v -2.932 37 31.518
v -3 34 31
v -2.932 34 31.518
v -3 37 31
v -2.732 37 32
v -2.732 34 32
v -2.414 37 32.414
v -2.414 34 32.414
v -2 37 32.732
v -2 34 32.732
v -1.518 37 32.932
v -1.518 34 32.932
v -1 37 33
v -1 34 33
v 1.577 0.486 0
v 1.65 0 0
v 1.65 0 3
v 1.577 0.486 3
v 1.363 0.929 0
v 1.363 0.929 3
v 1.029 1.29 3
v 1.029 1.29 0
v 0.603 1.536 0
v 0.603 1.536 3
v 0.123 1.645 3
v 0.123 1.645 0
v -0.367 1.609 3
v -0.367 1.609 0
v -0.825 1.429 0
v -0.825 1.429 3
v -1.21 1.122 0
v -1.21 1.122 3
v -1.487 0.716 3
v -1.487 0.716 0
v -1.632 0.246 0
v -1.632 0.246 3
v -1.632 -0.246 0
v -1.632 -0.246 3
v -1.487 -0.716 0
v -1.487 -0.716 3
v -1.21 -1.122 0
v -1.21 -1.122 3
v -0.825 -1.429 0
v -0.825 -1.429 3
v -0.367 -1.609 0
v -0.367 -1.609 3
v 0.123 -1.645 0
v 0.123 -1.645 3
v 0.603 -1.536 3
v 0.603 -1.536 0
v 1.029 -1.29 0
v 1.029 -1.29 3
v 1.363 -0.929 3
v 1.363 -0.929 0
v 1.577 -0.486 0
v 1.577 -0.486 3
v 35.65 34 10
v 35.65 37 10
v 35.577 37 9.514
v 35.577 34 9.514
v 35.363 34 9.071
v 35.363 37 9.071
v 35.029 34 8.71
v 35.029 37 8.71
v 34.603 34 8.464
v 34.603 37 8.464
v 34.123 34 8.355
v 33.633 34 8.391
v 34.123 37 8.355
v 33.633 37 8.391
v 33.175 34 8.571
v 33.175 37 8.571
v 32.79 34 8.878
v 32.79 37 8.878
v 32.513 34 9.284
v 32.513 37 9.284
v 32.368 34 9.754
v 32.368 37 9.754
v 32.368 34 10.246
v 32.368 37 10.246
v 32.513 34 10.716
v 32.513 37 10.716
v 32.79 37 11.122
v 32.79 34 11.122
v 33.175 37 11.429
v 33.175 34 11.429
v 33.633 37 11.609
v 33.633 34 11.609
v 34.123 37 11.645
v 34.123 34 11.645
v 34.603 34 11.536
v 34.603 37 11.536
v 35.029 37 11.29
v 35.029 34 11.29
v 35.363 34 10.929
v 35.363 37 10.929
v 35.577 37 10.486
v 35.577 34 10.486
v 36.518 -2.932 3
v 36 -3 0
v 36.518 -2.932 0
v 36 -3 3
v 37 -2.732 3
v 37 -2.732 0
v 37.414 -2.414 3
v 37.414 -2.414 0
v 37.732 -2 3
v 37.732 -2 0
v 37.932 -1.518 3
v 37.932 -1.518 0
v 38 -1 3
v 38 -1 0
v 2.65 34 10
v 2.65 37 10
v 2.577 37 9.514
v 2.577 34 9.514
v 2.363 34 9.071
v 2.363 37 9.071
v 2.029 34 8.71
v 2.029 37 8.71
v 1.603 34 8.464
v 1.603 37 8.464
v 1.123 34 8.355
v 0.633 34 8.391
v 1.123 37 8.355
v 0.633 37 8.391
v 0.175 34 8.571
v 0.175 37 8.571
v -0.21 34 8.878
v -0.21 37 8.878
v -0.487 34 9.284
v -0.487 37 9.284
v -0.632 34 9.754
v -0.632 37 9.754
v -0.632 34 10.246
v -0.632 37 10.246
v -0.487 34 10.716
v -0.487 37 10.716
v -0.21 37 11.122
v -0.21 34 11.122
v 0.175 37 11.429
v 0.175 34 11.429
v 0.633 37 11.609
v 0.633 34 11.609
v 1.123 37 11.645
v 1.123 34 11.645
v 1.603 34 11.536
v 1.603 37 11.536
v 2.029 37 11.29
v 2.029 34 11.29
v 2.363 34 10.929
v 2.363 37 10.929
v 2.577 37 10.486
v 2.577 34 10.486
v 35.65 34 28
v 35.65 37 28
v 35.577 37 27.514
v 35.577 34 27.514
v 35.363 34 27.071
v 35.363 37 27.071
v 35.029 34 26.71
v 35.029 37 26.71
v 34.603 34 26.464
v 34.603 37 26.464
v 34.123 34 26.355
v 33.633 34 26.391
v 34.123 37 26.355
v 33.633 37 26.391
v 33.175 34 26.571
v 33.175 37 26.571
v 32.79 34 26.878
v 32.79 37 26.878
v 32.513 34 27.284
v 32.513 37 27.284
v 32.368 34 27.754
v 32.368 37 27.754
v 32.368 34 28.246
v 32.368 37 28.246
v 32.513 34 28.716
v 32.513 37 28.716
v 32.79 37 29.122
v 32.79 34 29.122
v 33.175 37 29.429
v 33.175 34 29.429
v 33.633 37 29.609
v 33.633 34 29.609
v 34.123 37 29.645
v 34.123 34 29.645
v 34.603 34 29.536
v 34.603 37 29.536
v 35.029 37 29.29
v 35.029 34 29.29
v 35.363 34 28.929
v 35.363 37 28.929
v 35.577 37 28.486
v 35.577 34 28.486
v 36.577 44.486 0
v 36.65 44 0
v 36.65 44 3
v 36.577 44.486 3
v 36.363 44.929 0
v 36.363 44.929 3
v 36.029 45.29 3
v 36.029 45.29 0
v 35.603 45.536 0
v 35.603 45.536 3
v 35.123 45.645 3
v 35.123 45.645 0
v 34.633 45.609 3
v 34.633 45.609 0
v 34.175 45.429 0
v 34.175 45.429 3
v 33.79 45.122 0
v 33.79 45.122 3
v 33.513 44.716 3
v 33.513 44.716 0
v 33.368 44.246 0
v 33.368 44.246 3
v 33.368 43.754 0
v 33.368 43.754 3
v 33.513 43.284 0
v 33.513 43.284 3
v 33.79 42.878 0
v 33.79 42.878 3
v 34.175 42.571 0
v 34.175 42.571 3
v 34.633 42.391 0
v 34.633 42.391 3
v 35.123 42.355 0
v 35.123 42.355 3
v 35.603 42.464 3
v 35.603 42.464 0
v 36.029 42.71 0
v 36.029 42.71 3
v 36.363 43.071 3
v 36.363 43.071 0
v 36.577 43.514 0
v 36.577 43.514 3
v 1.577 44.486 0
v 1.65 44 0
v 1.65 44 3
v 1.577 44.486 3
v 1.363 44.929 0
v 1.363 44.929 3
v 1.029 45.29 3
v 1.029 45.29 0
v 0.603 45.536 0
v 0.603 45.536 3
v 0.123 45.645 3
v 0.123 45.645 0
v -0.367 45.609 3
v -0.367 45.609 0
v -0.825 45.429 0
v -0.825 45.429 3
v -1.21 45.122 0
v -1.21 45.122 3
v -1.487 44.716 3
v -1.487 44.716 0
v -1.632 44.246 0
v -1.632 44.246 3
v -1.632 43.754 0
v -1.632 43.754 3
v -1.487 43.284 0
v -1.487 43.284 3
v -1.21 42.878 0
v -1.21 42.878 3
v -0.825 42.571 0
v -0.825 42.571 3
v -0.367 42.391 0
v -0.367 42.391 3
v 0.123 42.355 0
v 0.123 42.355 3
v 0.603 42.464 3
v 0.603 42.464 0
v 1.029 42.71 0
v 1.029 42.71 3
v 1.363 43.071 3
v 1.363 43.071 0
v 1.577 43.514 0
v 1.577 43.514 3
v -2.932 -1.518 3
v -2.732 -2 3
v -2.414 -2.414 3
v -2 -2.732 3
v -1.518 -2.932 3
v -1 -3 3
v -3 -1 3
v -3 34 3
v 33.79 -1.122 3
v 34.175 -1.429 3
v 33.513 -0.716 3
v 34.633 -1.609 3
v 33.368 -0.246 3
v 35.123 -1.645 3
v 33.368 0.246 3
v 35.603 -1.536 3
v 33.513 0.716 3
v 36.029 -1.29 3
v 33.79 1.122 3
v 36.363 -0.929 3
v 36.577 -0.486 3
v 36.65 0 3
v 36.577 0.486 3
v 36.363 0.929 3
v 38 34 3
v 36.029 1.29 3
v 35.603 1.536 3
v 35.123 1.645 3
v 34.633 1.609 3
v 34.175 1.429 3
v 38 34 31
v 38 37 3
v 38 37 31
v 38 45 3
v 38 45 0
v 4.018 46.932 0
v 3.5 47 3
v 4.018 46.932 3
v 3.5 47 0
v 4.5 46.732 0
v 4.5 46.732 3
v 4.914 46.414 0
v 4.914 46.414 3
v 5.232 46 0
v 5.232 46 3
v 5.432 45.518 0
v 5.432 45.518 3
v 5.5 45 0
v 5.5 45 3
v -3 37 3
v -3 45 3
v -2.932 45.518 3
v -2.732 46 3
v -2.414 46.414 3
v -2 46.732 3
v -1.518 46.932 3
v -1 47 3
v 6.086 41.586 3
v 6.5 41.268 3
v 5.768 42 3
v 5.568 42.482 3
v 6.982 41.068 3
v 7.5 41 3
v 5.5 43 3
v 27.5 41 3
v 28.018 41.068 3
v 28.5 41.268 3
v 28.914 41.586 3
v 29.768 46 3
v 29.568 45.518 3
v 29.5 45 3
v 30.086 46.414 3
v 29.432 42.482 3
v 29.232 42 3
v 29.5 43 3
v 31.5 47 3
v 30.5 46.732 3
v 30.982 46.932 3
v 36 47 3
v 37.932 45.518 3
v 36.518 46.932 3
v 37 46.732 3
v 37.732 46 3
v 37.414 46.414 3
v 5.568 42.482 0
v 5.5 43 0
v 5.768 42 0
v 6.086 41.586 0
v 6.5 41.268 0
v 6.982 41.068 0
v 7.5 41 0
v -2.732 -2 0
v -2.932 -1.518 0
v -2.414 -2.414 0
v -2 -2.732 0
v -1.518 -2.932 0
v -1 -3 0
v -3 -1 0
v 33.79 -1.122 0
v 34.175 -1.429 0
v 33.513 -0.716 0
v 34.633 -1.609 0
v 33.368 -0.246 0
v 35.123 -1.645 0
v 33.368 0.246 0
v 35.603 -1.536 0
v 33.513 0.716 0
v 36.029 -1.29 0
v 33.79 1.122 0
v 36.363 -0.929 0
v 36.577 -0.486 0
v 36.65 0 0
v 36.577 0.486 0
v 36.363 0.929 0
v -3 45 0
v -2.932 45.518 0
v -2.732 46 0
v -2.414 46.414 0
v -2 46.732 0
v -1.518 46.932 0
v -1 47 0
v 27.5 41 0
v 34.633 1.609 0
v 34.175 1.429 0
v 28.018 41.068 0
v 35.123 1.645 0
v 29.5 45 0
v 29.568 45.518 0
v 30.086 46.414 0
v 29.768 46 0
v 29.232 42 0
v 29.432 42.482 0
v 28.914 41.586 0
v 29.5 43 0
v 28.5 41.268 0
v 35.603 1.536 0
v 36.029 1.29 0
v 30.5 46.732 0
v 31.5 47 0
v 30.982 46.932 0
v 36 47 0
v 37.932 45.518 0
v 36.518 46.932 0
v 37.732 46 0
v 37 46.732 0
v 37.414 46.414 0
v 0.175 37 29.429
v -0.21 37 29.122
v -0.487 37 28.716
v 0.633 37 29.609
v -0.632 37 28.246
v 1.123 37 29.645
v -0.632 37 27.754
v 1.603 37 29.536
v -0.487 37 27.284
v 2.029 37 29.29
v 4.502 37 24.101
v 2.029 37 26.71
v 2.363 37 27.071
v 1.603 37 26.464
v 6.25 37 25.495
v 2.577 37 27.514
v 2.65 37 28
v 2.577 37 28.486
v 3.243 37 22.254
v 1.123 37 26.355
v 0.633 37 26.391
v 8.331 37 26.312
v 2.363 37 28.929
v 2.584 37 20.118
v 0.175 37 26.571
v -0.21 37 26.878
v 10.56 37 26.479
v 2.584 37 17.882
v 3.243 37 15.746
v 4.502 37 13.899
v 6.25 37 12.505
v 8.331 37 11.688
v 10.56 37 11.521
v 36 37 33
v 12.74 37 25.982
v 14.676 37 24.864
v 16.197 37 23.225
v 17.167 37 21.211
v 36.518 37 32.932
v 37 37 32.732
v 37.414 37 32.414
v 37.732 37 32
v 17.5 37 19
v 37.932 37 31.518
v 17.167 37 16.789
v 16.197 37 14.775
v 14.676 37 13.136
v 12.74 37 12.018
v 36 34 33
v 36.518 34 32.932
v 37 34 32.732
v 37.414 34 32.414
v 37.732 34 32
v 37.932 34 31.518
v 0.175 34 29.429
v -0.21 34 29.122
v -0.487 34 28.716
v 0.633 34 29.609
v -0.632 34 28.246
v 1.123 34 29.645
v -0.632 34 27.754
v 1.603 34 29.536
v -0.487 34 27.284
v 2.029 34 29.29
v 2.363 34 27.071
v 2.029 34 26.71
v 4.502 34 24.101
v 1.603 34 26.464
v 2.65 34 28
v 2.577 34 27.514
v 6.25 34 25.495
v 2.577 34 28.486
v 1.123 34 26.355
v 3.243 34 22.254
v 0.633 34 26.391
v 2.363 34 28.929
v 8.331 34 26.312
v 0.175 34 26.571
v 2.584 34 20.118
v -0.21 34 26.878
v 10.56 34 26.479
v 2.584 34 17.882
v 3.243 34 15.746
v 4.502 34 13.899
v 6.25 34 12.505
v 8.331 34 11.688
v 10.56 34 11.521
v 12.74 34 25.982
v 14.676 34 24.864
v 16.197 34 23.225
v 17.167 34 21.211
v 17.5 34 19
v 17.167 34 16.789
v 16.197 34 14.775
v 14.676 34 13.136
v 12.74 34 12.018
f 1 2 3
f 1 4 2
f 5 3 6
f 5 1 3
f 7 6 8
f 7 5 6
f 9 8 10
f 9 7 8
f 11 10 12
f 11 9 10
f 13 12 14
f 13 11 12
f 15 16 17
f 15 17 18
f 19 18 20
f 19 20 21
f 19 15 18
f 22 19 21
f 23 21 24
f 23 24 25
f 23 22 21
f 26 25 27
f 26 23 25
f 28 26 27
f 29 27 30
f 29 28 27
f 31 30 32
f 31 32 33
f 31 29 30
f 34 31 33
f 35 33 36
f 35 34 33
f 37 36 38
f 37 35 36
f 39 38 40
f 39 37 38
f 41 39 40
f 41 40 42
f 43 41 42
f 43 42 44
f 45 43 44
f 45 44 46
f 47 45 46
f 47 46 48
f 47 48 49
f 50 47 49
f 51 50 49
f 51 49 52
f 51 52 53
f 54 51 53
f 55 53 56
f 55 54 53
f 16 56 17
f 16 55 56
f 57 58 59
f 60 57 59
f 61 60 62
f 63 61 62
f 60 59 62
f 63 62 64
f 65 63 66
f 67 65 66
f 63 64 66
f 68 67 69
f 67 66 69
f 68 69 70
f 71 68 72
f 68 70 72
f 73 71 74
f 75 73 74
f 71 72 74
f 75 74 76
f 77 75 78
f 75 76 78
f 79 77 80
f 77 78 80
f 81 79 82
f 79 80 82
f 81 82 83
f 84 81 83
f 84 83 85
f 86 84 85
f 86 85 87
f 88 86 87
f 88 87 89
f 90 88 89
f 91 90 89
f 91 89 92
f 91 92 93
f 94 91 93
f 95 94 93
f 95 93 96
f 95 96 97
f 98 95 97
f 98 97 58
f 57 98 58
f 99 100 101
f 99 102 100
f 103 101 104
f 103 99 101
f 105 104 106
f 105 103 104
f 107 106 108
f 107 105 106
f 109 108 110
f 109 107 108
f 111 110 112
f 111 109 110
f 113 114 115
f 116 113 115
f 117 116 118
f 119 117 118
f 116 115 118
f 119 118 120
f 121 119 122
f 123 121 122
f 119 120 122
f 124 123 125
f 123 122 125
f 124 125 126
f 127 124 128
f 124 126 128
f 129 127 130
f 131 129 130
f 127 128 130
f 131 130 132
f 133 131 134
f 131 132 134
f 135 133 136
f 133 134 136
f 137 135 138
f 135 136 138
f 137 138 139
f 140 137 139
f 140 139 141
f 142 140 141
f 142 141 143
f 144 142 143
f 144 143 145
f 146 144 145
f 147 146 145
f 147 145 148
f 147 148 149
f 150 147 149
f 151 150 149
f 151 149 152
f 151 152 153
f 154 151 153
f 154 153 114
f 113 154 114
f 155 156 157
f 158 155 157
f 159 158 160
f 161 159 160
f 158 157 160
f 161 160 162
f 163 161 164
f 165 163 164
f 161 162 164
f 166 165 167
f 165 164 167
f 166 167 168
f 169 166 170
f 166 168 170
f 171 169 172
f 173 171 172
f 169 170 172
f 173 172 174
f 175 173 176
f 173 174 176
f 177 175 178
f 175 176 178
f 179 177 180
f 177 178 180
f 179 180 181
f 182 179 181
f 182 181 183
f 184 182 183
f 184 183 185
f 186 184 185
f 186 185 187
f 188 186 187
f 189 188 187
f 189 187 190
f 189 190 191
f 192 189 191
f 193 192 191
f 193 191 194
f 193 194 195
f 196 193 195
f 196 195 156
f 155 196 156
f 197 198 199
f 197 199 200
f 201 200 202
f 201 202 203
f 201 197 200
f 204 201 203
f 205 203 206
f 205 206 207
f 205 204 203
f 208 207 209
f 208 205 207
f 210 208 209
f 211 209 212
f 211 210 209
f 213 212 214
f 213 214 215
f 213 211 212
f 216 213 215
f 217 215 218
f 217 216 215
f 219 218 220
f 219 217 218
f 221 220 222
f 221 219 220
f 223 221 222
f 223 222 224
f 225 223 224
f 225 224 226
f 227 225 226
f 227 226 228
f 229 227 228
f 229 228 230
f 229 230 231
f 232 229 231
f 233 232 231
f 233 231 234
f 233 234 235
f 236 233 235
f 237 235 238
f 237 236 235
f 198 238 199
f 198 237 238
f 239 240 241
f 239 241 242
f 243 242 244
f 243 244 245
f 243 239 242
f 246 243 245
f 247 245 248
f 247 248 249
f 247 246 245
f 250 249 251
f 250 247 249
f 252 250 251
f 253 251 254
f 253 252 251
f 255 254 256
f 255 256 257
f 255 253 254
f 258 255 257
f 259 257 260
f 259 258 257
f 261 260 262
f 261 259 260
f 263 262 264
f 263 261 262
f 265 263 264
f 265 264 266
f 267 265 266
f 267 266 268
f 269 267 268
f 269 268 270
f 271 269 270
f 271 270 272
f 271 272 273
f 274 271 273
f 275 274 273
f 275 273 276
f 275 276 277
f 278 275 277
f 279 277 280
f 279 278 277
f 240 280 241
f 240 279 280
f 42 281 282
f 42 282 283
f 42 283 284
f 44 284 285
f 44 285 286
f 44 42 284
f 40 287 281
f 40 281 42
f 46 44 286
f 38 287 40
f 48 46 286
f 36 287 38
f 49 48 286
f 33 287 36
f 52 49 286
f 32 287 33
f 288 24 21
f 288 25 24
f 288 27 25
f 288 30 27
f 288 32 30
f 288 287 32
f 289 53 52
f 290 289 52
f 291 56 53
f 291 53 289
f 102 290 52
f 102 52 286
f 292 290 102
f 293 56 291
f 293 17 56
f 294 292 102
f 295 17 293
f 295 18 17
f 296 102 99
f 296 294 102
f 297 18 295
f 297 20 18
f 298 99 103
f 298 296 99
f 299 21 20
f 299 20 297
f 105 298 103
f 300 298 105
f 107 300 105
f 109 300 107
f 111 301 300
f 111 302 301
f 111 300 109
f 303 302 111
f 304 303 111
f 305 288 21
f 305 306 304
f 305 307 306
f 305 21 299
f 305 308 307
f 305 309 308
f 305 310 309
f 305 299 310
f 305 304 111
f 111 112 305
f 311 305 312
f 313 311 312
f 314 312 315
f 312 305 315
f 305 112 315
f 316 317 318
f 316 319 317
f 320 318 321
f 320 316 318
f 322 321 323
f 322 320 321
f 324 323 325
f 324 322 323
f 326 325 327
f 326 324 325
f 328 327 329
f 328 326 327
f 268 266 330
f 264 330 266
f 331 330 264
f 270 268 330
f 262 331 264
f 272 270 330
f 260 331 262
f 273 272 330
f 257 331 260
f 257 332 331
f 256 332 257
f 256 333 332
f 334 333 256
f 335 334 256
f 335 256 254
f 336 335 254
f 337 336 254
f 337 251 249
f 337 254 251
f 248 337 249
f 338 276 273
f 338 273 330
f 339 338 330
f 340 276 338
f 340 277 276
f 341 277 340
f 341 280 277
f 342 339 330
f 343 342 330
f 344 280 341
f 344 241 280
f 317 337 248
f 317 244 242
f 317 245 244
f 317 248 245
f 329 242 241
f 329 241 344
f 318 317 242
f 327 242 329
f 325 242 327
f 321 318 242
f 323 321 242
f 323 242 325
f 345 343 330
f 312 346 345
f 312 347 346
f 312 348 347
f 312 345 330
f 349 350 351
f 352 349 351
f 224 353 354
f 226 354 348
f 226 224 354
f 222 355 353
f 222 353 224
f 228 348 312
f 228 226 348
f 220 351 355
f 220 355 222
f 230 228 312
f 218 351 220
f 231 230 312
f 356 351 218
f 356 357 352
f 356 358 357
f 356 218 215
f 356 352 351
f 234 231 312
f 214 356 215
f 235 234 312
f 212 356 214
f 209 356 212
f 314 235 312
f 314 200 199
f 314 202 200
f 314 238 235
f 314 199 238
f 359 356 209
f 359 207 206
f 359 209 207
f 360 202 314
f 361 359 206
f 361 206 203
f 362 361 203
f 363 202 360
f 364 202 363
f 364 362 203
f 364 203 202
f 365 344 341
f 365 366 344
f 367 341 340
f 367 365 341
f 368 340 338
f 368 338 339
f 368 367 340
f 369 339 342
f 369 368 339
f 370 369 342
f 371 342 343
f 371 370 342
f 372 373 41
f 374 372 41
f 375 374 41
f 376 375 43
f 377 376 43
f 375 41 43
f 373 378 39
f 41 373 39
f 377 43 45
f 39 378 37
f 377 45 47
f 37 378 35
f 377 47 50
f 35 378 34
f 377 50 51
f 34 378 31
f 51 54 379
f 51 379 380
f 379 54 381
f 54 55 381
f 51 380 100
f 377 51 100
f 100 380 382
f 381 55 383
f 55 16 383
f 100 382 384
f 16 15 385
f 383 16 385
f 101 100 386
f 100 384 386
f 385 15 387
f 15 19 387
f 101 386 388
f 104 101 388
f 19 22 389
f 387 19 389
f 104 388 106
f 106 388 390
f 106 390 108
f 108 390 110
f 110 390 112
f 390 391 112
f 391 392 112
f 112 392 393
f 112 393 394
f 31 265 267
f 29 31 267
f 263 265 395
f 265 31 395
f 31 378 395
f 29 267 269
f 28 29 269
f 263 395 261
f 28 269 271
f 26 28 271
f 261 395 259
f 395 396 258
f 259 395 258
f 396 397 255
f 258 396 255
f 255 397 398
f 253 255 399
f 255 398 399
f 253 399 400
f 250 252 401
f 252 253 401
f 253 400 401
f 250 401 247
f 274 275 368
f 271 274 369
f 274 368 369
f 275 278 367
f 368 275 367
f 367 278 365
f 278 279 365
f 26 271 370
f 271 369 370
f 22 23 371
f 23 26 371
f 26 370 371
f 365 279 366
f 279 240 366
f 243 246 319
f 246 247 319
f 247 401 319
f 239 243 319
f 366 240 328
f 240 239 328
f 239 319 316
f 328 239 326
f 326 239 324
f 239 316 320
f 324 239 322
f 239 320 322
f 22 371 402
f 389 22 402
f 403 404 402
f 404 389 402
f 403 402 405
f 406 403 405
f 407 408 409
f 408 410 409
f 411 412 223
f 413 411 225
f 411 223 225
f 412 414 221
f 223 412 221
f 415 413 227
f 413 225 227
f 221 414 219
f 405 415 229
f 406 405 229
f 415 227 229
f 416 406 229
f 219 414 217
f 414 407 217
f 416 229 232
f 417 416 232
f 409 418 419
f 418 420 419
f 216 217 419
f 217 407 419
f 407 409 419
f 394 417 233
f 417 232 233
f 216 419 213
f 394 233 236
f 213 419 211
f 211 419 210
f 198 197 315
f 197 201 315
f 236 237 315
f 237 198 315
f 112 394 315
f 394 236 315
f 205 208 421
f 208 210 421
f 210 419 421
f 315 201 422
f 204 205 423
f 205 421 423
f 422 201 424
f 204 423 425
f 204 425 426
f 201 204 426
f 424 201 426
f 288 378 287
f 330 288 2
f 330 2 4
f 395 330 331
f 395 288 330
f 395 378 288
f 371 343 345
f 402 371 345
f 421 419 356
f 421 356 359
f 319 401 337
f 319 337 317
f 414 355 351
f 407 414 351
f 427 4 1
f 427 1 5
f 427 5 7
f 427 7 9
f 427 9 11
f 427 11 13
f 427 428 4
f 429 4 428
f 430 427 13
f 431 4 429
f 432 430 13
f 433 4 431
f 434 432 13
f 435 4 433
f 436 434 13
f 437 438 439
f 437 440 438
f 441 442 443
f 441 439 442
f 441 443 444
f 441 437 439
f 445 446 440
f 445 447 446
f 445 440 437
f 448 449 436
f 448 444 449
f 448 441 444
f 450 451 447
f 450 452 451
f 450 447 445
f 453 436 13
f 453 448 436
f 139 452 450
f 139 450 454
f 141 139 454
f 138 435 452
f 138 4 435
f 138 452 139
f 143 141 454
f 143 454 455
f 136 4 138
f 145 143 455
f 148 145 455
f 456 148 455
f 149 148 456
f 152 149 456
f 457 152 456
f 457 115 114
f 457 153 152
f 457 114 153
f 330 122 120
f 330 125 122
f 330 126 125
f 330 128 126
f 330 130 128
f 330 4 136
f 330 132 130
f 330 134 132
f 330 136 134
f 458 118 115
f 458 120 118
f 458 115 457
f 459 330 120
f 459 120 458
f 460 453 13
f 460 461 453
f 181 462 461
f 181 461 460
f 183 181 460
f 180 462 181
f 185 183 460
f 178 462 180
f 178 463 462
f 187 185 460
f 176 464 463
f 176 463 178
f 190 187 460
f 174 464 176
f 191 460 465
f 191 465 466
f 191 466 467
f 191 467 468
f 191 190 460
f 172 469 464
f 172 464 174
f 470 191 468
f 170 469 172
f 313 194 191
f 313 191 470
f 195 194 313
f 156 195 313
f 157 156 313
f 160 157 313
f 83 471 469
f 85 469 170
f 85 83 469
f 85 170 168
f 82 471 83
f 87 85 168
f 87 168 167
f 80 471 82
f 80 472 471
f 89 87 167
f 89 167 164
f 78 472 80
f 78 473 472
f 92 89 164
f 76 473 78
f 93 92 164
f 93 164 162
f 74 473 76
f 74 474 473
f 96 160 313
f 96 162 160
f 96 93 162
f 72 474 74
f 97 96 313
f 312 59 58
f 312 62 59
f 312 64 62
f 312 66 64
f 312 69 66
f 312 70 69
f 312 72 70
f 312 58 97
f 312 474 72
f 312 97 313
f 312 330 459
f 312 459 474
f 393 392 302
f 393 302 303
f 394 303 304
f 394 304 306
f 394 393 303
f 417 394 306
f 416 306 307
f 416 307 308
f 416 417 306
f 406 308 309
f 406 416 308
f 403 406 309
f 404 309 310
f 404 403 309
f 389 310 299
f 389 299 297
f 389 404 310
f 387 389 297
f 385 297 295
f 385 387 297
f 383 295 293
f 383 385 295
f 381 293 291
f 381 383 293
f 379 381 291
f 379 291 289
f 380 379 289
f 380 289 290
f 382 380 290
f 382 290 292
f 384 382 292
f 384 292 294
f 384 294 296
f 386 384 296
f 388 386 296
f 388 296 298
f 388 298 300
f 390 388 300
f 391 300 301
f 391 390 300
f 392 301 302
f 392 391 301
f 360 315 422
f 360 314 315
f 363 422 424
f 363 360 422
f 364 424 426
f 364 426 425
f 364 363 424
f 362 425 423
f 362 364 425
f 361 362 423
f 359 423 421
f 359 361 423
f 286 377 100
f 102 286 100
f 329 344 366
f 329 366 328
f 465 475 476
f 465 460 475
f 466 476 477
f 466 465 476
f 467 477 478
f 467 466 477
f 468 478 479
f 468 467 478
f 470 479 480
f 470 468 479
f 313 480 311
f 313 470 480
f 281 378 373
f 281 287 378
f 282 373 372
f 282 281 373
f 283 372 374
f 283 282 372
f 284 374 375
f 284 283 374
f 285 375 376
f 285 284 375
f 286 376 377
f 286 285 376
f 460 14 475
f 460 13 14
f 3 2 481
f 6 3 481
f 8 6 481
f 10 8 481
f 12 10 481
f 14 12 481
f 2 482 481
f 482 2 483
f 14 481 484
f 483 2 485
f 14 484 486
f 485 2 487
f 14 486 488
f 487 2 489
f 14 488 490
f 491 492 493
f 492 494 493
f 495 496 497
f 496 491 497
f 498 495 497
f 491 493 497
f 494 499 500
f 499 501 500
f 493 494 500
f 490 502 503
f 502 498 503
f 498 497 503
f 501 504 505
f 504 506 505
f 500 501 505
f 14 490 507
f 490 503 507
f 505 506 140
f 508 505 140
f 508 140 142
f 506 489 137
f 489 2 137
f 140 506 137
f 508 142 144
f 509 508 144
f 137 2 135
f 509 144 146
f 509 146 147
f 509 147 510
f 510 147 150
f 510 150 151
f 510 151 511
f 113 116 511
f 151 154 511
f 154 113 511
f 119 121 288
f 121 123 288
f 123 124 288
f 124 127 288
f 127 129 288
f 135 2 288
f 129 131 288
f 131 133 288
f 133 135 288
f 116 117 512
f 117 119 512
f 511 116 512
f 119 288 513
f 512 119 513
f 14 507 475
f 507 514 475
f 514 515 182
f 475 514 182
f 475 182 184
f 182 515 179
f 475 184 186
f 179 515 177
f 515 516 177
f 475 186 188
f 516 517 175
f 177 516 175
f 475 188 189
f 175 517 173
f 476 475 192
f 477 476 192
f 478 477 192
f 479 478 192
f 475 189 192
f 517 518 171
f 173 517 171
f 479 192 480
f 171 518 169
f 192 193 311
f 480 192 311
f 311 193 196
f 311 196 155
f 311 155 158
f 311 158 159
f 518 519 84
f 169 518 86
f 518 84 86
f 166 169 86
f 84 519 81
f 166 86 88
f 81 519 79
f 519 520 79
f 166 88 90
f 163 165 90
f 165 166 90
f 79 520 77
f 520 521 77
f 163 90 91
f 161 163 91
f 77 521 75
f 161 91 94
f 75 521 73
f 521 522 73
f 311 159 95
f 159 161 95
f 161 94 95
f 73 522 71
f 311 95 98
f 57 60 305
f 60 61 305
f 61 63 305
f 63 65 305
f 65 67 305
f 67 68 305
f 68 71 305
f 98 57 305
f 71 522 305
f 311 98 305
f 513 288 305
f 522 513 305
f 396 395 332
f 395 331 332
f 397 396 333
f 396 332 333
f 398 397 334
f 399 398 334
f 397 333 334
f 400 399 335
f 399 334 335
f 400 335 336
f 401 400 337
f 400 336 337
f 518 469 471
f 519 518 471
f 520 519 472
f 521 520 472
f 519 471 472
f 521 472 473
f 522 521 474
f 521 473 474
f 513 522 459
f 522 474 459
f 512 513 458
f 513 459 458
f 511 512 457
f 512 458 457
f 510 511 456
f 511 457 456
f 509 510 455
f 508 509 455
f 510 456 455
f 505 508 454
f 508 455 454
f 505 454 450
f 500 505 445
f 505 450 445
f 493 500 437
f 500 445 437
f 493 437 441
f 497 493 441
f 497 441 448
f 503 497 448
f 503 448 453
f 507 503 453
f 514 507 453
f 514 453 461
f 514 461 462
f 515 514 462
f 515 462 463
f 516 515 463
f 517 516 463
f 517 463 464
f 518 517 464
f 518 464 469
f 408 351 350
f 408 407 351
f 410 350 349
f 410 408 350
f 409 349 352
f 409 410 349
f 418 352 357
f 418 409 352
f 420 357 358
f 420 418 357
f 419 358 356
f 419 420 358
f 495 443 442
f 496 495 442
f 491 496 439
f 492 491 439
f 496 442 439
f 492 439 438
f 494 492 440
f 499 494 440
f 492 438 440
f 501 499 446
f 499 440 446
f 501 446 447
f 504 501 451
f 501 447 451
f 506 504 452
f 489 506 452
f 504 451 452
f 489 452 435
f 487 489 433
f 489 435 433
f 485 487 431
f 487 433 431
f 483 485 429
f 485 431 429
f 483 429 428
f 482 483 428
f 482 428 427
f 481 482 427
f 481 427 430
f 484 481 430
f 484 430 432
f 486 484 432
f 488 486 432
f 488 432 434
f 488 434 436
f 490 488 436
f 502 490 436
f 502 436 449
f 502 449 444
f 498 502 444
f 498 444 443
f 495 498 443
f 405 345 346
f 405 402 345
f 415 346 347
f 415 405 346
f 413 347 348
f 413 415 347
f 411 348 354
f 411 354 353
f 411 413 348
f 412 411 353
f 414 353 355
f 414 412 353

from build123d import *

# Parameters (mm, degrees)
SKETCH1_W           = 41
SKETCH1_H           = 50
SKETCH1_R           = 1.65
BOSS_EXTRUDE1_DEPTH = 3
SKETCH2_W           = 41
SKETCH2_H           = 3
BOSS_EXTRUDE2_DEPTH = 30
SKETCH3_R           = 1.65
SKETCH3_R_2         = 7.5
CUT_EXTRUDE1_DEPTH  = 35
SKETCH4_W           = 24
SKETCH4_H           = 6
CUT_EXTRUDE2_DEPTH  = 10
FILLET2_R           = 2


with BuildPart() as part:
    # Sketch1 → Boss-Extrude1 (new body)
    with BuildSketch(Plane.XY):
        with Locations((17.5, 22)):
            Rectangle(SKETCH1_W, SKETCH1_H)
        with Locations((0, 44)):
            Circle(SKETCH1_R, mode=Mode.SUBTRACT)
        with Locations((35, 44)):
            Circle(SKETCH1_R, mode=Mode.SUBTRACT)
        with Locations((35, 0)):
            Circle(SKETCH1_R, mode=Mode.SUBTRACT)
        Circle(SKETCH1_R, mode=Mode.SUBTRACT)
    extrude(amount=BOSS_EXTRUDE1_DEPTH)

    # Sketch2 → Boss-Extrude2 (add)
    with BuildSketch(Plane.XY.offset(3)):
        with Locations((17.5, 35.5)):
            Rectangle(SKETCH2_W, SKETCH2_H)
    extrude(amount=BOSS_EXTRUDE2_DEPTH)

    # Sketch3 → Cut-Extrude1 (cut)
    with BuildSketch(Plane(origin=(0, 37, 0), x_dir=(1, 0, 0), z_dir=(0, 1, 0))):
        with Locations((34, -28)):
            Circle(SKETCH3_R)
        with Locations((34, -10)):
            Circle(SKETCH3_R)
        with Locations((1, -10)):
            Circle(SKETCH3_R)
        with Locations((1, -28)):
            Circle(SKETCH3_R)
        with Locations((10, -19)):
            Circle(SKETCH3_R_2)
    extrude(amount=-CUT_EXTRUDE1_DEPTH, mode=Mode.SUBTRACT)

    # Sketch4 → Cut-Extrude2 (cut)
    with BuildSketch(Plane.XY.offset(3)):
        with Locations((17.5, 44)):
            Rectangle(SKETCH4_W, SKETCH4_H)
    extrude(amount=-CUT_EXTRUDE2_DEPTH, mode=Mode.SUBTRACT)

    # Fillet2
    fillet2_edges = [part.edges().sort_by_distance(p)[0] for p in [
        (-3, 35.5, 33),
        (38, 35.5, 33),
        (5.5, 47, 1.5),
        (29.5, 47, 1.5),
        (-3, 47, 1.5),
        (38, 47, 1.5),
        (29.5, 41, 1.5),
        (5.5, 41, 1.5),
        (38, -3, 1.5),
        (-3, -3, 1.5),
    ]]
    fillet(fillet2_edges, radius=FILLET2_R)


solid = part.part
